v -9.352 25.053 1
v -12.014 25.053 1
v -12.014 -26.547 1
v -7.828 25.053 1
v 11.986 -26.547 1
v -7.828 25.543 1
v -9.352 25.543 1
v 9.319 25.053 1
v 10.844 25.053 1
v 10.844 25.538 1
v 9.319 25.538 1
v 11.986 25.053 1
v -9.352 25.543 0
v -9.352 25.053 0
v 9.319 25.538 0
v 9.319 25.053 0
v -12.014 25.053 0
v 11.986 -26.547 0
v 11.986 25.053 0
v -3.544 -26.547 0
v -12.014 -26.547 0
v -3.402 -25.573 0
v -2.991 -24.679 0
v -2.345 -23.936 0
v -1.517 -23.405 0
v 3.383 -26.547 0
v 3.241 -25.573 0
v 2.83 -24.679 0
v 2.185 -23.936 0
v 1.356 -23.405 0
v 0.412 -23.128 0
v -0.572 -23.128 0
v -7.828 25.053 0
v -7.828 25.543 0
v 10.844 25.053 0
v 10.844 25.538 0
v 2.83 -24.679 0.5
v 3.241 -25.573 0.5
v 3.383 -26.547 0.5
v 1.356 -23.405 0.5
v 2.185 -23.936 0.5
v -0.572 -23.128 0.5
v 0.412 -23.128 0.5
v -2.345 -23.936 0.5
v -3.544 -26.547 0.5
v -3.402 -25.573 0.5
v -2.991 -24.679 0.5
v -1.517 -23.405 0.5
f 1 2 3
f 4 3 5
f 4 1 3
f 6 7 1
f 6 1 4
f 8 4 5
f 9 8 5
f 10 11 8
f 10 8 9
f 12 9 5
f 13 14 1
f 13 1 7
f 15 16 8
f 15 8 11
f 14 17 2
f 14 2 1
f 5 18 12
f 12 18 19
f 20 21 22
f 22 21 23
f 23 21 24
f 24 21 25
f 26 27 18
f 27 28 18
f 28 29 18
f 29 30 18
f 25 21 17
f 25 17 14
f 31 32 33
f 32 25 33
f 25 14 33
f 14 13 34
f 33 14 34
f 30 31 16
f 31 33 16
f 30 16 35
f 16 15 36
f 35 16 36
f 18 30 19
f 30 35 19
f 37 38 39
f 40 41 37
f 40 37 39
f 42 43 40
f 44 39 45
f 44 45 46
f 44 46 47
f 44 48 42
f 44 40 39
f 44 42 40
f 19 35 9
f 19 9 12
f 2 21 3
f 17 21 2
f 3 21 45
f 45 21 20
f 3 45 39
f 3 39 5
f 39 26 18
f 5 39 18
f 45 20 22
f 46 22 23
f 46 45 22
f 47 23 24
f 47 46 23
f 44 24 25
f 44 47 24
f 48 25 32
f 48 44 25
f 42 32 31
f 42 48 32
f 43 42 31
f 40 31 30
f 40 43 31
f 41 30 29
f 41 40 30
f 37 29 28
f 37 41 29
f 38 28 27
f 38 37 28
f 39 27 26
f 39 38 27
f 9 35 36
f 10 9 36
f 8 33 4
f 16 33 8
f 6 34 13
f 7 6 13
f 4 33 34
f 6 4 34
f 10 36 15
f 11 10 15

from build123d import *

# Parameters (mm, degrees)
SKETCH1_W               = 24
SKETCH1_H               = 51.6
BOSS_EXTRUDE1_DEPTH     = 1
SKETCH2_W               = 1.52454199
SKETCH2_H               = 0.68782272
BOSS_EXTRUDE2_DEPTH     = 1
CUT_EXTRUDE1_DEPTH      = 30.156315931
CUT_EXTRUDE1_DEPTH_BACK = 0.5


with BuildPart() as part:
    # Sketch1 → Boss-Extrude1 (new body)
    with BuildSketch(Plane.XY):
        with Locations((-0.014342532, -0.747058824)):
            Rectangle(SKETCH1_W, SKETCH1_H)
    extrude(amount=BOSS_EXTRUDE1_DEPTH)

    # Sketch2 → Boss-Extrude2 (add)
    with BuildSketch(Plane(origin=(0, 0, 0), x_dir=(-1, 0, 0), z_dir=(0, 0, -1))):
        with Locations((-10.081520714, 25.194355877)):
            Rectangle(SKETCH2_W, SKETCH2_H)
        with Locations((8.590054208, 25.199009148)):
            Rectangle(SKETCH2_W, SKETCH2_H)
    extrude(amount=-BOSS_EXTRUDE2_DEPTH)

    # Sketch3 → Cut-Extrude1 (cut, two sides: drawn at the far end of the back side and taken through both)
    with BuildSketch(Plane(origin=(0, 0, 0), x_dir=(-1, 0, 0), z_dir=(0, 0, -1)).offset(-CUT_EXTRUDE1_DEPTH_BACK)):
        with BuildLine():
            Line((-3.38328462, -26.547058824), (3.544014575, -26.547058824))
            ThreePointArc((3.544014575, -26.547058824), (0.080364977, -23.092635137), (-3.38328462, -26.547058824))
        make_face()
    extrude(amount=CUT_EXTRUDE1_DEPTH + CUT_EXTRUDE1_DEPTH_BACK, mode=Mode.SUBTRACT)


solid = part.part
